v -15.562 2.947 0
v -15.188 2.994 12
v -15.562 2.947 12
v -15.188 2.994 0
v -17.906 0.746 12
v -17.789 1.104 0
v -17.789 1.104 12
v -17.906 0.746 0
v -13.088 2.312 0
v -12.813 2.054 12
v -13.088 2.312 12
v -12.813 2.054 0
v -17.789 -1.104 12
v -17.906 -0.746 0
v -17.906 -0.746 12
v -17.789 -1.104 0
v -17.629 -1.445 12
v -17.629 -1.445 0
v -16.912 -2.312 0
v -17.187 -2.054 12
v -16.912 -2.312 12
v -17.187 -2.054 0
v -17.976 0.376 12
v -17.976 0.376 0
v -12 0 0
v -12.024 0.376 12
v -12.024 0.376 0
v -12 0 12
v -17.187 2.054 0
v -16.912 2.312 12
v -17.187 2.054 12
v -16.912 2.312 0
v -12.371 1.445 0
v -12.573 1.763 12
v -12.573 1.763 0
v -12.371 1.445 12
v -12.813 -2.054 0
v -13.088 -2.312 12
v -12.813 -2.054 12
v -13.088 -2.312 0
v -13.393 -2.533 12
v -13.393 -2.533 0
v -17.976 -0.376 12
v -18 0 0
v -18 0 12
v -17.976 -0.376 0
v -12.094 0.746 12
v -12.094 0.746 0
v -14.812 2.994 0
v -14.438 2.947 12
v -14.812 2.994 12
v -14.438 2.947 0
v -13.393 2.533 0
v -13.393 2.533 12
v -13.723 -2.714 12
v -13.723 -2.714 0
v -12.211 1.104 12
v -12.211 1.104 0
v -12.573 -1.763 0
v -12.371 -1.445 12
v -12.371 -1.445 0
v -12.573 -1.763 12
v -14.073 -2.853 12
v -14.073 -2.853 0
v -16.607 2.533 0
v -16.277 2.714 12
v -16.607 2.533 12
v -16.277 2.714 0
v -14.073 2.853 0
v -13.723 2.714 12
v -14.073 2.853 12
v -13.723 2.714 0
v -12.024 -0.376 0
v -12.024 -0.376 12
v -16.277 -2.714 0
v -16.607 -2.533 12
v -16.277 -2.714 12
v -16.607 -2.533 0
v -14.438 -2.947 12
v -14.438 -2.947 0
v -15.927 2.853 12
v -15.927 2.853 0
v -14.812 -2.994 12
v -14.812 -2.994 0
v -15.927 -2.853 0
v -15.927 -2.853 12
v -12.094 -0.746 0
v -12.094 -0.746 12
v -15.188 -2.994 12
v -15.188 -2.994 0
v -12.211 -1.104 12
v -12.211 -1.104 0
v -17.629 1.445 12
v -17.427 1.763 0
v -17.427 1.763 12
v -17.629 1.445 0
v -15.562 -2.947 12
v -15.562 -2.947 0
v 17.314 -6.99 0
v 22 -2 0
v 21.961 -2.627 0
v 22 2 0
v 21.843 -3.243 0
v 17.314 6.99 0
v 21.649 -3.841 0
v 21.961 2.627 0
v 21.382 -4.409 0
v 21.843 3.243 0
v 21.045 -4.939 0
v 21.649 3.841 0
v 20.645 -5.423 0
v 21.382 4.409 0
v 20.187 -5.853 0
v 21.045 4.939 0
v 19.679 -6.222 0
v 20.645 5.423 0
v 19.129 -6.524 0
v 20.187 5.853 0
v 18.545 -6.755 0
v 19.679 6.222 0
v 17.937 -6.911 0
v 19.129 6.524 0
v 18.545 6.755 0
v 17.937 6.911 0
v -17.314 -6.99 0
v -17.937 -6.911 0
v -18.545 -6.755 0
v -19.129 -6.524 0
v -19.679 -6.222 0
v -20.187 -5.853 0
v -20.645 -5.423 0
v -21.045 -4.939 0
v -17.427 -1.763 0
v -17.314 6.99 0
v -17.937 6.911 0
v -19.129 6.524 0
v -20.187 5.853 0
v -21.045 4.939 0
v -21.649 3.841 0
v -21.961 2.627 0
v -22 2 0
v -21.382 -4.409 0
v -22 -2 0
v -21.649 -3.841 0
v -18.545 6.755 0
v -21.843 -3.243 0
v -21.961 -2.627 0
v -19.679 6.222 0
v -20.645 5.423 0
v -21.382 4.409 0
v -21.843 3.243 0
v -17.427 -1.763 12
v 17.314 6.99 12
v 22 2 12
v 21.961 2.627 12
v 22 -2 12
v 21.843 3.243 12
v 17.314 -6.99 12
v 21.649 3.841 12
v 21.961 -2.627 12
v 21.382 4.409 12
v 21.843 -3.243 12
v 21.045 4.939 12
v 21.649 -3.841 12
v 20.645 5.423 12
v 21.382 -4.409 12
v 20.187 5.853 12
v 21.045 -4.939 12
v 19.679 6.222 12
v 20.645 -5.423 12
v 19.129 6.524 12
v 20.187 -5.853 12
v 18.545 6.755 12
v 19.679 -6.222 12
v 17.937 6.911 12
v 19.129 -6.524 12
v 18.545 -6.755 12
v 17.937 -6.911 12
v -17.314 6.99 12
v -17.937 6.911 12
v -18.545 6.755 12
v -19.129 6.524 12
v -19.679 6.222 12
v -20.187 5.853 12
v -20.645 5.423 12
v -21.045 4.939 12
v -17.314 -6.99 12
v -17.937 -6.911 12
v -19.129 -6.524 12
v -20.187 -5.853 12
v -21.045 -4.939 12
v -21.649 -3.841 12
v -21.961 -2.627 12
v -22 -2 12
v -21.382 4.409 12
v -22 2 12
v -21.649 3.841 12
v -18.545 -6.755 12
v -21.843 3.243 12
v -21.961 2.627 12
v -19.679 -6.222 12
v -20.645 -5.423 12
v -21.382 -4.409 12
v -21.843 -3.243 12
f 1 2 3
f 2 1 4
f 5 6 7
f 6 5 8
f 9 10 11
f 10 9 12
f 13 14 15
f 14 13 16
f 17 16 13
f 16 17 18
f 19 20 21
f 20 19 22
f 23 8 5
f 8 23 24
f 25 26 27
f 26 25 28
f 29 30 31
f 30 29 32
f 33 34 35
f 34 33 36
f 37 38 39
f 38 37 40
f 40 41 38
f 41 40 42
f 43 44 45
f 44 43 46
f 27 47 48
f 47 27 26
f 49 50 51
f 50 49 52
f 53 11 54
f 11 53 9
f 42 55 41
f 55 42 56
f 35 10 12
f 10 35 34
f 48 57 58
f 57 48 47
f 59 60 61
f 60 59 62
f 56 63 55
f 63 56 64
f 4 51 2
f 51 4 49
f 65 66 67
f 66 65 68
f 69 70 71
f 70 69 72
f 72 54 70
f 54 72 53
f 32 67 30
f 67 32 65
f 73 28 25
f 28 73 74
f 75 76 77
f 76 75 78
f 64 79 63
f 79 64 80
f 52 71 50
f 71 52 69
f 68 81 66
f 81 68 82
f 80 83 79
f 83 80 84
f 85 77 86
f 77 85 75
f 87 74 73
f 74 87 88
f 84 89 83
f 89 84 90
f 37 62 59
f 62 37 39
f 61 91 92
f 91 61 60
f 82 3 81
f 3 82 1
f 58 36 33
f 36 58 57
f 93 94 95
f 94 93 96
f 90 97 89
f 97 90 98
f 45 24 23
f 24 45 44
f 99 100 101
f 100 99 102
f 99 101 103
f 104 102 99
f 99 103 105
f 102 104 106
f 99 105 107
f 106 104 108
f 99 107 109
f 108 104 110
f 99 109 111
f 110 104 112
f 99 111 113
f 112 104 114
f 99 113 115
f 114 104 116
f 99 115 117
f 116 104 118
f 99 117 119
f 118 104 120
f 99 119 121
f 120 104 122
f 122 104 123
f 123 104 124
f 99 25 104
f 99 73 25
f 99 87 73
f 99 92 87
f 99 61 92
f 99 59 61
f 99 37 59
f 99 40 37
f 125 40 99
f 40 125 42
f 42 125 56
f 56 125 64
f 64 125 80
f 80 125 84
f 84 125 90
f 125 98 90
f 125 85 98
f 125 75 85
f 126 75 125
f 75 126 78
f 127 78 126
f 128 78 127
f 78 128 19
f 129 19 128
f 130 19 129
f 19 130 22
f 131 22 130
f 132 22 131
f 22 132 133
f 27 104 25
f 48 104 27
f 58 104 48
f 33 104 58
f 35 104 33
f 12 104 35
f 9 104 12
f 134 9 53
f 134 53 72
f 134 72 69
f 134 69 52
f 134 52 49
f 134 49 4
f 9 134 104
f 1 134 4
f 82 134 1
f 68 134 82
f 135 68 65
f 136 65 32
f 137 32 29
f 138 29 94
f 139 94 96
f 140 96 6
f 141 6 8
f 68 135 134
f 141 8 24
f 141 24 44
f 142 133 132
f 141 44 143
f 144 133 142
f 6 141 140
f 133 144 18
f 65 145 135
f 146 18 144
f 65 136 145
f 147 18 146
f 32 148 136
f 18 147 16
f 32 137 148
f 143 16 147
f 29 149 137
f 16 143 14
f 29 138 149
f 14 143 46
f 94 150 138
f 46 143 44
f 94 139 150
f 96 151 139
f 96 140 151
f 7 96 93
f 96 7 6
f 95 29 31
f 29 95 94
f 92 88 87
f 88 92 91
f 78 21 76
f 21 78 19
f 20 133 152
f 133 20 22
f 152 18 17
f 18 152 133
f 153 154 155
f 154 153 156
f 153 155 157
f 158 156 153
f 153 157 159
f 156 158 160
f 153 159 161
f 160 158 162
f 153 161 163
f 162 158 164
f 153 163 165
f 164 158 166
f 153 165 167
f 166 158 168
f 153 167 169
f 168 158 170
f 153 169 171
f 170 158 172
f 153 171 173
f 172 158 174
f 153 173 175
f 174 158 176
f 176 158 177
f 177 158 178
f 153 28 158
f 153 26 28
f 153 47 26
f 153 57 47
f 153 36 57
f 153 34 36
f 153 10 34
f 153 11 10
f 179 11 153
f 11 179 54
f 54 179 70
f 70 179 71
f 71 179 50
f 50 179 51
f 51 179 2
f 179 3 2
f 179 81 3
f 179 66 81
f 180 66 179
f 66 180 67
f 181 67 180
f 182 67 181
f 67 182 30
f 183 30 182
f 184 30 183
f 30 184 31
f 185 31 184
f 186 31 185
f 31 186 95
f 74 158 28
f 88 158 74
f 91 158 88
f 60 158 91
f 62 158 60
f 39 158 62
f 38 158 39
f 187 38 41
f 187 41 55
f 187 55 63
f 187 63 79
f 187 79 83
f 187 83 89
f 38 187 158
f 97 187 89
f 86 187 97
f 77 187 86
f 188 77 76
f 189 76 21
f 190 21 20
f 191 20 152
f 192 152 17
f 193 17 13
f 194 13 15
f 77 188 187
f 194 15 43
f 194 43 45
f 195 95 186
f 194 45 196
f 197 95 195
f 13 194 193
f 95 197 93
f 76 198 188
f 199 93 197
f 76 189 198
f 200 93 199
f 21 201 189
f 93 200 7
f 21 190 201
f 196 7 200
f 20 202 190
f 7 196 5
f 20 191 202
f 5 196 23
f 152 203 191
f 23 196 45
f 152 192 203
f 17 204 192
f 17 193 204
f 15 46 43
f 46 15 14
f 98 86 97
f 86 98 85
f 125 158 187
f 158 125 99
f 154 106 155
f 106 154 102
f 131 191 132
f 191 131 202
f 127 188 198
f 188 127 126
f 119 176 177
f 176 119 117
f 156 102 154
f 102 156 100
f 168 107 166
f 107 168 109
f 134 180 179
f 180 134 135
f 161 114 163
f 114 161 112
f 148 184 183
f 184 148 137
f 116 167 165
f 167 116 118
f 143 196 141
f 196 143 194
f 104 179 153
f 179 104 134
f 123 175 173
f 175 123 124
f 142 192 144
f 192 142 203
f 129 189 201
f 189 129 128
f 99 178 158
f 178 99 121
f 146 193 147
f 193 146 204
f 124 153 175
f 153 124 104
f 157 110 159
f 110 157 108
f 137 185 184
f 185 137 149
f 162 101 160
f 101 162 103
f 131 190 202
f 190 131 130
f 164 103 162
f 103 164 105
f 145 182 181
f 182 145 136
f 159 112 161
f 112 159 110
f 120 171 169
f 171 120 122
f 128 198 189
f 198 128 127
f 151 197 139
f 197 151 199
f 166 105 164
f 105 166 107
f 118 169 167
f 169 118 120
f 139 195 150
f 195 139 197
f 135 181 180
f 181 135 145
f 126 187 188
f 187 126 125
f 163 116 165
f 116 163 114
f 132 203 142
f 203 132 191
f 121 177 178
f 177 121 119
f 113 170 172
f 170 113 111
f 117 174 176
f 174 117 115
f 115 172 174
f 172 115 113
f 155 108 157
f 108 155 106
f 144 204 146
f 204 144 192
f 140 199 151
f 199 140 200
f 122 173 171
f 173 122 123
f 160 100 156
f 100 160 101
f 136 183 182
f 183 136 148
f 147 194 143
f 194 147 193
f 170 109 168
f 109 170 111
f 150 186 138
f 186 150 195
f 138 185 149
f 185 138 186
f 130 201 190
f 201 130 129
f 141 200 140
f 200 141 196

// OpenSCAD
$fn = 50;


difference() {
	union() {
		hull() {
			translate(v = [-17.0000000000, 2.0000000000, 0]) {
				cylinder(h = 12, r = 5);
			}
			translate(v = [17.0000000000, 2.0000000000, 0]) {
				cylinder(h = 12, r = 5);
			}
			translate(v = [-17.0000000000, -2.0000000000, 0]) {
				cylinder(h = 12, r = 5);
			}
			translate(v = [17.0000000000, -2.0000000000, 0]) {
				cylinder(h = 12, r = 5);
			}
		}
	}
	union() {
		translate(v = [-15.0000000000, 0.0000000000, 0]) {
			cylinder(h = 12, r = 3.0000000000);
		}
		translate(v = [-15.0000000000, 0.0000000000, 0]) {
			cylinder(h = 12, r = 1.5000000000);
		}
		translate(v = [-15.0000000000, 0.0000000000, 0]) {
			cylinder(h = 12, r = 1.5000000000);
		}
		translate(v = [-15.0000000000, 0.0000000000, 0]) {
			cylinder(h = 12, r = 1.5000000000);
		}
	}
}
